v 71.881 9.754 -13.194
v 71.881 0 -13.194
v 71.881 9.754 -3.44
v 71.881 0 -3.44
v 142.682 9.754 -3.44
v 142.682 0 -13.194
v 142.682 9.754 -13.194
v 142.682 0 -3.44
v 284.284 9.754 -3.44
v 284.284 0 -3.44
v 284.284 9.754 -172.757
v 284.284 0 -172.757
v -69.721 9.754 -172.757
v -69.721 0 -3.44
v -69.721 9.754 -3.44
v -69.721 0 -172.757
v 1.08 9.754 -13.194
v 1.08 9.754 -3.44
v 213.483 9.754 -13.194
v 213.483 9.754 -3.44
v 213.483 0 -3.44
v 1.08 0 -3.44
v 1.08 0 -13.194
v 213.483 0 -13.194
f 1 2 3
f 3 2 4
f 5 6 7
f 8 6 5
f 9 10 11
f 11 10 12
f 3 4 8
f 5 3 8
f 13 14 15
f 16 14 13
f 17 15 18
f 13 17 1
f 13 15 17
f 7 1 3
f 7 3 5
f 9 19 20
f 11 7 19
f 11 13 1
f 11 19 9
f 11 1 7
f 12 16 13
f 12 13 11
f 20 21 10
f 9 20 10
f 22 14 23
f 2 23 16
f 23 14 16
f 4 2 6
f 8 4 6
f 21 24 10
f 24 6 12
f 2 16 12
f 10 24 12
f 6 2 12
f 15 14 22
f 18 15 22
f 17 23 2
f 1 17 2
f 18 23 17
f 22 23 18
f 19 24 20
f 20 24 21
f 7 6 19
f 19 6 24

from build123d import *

# Parameters (mm, degrees)
SKETCH1_W           = 354.00488
SKETCH1_H           = 169.3164
BOSS_EXTRUDE1_DEPTH = 9.7536
SKETCH2_W           = 70.800976
SKETCH2_H           = 9.7536
CUT_EXTRUDE1_DEPTH  = 333.802189186


with BuildPart() as part:
    # Sketch1 → Boss-Extrude1 (new body)
    with BuildSketch(Plane(origin=(0, 0, 0), x_dir=(1, 0, 0), z_dir=(0, 1, 0))):
        with Locations((107.281446772, 88.098380587)):
            Rectangle(SKETCH1_W, SKETCH1_H)
    extrude(amount=BOSS_EXTRUDE1_DEPTH)

    # Sketch2 → Cut-Extrude1 (cut, through all)
    with BuildSketch(Plane.XZ):
        with Locations((178.082422772, -8.316980587)):
            Rectangle(SKETCH2_W, SKETCH2_H)
        with Locations((36.480470772, -8.316980587)):
            Rectangle(SKETCH2_W, SKETCH2_H)
    extrude(amount=-CUT_EXTRUDE1_DEPTH, mode=Mode.SUBTRACT)


solid = part.part
